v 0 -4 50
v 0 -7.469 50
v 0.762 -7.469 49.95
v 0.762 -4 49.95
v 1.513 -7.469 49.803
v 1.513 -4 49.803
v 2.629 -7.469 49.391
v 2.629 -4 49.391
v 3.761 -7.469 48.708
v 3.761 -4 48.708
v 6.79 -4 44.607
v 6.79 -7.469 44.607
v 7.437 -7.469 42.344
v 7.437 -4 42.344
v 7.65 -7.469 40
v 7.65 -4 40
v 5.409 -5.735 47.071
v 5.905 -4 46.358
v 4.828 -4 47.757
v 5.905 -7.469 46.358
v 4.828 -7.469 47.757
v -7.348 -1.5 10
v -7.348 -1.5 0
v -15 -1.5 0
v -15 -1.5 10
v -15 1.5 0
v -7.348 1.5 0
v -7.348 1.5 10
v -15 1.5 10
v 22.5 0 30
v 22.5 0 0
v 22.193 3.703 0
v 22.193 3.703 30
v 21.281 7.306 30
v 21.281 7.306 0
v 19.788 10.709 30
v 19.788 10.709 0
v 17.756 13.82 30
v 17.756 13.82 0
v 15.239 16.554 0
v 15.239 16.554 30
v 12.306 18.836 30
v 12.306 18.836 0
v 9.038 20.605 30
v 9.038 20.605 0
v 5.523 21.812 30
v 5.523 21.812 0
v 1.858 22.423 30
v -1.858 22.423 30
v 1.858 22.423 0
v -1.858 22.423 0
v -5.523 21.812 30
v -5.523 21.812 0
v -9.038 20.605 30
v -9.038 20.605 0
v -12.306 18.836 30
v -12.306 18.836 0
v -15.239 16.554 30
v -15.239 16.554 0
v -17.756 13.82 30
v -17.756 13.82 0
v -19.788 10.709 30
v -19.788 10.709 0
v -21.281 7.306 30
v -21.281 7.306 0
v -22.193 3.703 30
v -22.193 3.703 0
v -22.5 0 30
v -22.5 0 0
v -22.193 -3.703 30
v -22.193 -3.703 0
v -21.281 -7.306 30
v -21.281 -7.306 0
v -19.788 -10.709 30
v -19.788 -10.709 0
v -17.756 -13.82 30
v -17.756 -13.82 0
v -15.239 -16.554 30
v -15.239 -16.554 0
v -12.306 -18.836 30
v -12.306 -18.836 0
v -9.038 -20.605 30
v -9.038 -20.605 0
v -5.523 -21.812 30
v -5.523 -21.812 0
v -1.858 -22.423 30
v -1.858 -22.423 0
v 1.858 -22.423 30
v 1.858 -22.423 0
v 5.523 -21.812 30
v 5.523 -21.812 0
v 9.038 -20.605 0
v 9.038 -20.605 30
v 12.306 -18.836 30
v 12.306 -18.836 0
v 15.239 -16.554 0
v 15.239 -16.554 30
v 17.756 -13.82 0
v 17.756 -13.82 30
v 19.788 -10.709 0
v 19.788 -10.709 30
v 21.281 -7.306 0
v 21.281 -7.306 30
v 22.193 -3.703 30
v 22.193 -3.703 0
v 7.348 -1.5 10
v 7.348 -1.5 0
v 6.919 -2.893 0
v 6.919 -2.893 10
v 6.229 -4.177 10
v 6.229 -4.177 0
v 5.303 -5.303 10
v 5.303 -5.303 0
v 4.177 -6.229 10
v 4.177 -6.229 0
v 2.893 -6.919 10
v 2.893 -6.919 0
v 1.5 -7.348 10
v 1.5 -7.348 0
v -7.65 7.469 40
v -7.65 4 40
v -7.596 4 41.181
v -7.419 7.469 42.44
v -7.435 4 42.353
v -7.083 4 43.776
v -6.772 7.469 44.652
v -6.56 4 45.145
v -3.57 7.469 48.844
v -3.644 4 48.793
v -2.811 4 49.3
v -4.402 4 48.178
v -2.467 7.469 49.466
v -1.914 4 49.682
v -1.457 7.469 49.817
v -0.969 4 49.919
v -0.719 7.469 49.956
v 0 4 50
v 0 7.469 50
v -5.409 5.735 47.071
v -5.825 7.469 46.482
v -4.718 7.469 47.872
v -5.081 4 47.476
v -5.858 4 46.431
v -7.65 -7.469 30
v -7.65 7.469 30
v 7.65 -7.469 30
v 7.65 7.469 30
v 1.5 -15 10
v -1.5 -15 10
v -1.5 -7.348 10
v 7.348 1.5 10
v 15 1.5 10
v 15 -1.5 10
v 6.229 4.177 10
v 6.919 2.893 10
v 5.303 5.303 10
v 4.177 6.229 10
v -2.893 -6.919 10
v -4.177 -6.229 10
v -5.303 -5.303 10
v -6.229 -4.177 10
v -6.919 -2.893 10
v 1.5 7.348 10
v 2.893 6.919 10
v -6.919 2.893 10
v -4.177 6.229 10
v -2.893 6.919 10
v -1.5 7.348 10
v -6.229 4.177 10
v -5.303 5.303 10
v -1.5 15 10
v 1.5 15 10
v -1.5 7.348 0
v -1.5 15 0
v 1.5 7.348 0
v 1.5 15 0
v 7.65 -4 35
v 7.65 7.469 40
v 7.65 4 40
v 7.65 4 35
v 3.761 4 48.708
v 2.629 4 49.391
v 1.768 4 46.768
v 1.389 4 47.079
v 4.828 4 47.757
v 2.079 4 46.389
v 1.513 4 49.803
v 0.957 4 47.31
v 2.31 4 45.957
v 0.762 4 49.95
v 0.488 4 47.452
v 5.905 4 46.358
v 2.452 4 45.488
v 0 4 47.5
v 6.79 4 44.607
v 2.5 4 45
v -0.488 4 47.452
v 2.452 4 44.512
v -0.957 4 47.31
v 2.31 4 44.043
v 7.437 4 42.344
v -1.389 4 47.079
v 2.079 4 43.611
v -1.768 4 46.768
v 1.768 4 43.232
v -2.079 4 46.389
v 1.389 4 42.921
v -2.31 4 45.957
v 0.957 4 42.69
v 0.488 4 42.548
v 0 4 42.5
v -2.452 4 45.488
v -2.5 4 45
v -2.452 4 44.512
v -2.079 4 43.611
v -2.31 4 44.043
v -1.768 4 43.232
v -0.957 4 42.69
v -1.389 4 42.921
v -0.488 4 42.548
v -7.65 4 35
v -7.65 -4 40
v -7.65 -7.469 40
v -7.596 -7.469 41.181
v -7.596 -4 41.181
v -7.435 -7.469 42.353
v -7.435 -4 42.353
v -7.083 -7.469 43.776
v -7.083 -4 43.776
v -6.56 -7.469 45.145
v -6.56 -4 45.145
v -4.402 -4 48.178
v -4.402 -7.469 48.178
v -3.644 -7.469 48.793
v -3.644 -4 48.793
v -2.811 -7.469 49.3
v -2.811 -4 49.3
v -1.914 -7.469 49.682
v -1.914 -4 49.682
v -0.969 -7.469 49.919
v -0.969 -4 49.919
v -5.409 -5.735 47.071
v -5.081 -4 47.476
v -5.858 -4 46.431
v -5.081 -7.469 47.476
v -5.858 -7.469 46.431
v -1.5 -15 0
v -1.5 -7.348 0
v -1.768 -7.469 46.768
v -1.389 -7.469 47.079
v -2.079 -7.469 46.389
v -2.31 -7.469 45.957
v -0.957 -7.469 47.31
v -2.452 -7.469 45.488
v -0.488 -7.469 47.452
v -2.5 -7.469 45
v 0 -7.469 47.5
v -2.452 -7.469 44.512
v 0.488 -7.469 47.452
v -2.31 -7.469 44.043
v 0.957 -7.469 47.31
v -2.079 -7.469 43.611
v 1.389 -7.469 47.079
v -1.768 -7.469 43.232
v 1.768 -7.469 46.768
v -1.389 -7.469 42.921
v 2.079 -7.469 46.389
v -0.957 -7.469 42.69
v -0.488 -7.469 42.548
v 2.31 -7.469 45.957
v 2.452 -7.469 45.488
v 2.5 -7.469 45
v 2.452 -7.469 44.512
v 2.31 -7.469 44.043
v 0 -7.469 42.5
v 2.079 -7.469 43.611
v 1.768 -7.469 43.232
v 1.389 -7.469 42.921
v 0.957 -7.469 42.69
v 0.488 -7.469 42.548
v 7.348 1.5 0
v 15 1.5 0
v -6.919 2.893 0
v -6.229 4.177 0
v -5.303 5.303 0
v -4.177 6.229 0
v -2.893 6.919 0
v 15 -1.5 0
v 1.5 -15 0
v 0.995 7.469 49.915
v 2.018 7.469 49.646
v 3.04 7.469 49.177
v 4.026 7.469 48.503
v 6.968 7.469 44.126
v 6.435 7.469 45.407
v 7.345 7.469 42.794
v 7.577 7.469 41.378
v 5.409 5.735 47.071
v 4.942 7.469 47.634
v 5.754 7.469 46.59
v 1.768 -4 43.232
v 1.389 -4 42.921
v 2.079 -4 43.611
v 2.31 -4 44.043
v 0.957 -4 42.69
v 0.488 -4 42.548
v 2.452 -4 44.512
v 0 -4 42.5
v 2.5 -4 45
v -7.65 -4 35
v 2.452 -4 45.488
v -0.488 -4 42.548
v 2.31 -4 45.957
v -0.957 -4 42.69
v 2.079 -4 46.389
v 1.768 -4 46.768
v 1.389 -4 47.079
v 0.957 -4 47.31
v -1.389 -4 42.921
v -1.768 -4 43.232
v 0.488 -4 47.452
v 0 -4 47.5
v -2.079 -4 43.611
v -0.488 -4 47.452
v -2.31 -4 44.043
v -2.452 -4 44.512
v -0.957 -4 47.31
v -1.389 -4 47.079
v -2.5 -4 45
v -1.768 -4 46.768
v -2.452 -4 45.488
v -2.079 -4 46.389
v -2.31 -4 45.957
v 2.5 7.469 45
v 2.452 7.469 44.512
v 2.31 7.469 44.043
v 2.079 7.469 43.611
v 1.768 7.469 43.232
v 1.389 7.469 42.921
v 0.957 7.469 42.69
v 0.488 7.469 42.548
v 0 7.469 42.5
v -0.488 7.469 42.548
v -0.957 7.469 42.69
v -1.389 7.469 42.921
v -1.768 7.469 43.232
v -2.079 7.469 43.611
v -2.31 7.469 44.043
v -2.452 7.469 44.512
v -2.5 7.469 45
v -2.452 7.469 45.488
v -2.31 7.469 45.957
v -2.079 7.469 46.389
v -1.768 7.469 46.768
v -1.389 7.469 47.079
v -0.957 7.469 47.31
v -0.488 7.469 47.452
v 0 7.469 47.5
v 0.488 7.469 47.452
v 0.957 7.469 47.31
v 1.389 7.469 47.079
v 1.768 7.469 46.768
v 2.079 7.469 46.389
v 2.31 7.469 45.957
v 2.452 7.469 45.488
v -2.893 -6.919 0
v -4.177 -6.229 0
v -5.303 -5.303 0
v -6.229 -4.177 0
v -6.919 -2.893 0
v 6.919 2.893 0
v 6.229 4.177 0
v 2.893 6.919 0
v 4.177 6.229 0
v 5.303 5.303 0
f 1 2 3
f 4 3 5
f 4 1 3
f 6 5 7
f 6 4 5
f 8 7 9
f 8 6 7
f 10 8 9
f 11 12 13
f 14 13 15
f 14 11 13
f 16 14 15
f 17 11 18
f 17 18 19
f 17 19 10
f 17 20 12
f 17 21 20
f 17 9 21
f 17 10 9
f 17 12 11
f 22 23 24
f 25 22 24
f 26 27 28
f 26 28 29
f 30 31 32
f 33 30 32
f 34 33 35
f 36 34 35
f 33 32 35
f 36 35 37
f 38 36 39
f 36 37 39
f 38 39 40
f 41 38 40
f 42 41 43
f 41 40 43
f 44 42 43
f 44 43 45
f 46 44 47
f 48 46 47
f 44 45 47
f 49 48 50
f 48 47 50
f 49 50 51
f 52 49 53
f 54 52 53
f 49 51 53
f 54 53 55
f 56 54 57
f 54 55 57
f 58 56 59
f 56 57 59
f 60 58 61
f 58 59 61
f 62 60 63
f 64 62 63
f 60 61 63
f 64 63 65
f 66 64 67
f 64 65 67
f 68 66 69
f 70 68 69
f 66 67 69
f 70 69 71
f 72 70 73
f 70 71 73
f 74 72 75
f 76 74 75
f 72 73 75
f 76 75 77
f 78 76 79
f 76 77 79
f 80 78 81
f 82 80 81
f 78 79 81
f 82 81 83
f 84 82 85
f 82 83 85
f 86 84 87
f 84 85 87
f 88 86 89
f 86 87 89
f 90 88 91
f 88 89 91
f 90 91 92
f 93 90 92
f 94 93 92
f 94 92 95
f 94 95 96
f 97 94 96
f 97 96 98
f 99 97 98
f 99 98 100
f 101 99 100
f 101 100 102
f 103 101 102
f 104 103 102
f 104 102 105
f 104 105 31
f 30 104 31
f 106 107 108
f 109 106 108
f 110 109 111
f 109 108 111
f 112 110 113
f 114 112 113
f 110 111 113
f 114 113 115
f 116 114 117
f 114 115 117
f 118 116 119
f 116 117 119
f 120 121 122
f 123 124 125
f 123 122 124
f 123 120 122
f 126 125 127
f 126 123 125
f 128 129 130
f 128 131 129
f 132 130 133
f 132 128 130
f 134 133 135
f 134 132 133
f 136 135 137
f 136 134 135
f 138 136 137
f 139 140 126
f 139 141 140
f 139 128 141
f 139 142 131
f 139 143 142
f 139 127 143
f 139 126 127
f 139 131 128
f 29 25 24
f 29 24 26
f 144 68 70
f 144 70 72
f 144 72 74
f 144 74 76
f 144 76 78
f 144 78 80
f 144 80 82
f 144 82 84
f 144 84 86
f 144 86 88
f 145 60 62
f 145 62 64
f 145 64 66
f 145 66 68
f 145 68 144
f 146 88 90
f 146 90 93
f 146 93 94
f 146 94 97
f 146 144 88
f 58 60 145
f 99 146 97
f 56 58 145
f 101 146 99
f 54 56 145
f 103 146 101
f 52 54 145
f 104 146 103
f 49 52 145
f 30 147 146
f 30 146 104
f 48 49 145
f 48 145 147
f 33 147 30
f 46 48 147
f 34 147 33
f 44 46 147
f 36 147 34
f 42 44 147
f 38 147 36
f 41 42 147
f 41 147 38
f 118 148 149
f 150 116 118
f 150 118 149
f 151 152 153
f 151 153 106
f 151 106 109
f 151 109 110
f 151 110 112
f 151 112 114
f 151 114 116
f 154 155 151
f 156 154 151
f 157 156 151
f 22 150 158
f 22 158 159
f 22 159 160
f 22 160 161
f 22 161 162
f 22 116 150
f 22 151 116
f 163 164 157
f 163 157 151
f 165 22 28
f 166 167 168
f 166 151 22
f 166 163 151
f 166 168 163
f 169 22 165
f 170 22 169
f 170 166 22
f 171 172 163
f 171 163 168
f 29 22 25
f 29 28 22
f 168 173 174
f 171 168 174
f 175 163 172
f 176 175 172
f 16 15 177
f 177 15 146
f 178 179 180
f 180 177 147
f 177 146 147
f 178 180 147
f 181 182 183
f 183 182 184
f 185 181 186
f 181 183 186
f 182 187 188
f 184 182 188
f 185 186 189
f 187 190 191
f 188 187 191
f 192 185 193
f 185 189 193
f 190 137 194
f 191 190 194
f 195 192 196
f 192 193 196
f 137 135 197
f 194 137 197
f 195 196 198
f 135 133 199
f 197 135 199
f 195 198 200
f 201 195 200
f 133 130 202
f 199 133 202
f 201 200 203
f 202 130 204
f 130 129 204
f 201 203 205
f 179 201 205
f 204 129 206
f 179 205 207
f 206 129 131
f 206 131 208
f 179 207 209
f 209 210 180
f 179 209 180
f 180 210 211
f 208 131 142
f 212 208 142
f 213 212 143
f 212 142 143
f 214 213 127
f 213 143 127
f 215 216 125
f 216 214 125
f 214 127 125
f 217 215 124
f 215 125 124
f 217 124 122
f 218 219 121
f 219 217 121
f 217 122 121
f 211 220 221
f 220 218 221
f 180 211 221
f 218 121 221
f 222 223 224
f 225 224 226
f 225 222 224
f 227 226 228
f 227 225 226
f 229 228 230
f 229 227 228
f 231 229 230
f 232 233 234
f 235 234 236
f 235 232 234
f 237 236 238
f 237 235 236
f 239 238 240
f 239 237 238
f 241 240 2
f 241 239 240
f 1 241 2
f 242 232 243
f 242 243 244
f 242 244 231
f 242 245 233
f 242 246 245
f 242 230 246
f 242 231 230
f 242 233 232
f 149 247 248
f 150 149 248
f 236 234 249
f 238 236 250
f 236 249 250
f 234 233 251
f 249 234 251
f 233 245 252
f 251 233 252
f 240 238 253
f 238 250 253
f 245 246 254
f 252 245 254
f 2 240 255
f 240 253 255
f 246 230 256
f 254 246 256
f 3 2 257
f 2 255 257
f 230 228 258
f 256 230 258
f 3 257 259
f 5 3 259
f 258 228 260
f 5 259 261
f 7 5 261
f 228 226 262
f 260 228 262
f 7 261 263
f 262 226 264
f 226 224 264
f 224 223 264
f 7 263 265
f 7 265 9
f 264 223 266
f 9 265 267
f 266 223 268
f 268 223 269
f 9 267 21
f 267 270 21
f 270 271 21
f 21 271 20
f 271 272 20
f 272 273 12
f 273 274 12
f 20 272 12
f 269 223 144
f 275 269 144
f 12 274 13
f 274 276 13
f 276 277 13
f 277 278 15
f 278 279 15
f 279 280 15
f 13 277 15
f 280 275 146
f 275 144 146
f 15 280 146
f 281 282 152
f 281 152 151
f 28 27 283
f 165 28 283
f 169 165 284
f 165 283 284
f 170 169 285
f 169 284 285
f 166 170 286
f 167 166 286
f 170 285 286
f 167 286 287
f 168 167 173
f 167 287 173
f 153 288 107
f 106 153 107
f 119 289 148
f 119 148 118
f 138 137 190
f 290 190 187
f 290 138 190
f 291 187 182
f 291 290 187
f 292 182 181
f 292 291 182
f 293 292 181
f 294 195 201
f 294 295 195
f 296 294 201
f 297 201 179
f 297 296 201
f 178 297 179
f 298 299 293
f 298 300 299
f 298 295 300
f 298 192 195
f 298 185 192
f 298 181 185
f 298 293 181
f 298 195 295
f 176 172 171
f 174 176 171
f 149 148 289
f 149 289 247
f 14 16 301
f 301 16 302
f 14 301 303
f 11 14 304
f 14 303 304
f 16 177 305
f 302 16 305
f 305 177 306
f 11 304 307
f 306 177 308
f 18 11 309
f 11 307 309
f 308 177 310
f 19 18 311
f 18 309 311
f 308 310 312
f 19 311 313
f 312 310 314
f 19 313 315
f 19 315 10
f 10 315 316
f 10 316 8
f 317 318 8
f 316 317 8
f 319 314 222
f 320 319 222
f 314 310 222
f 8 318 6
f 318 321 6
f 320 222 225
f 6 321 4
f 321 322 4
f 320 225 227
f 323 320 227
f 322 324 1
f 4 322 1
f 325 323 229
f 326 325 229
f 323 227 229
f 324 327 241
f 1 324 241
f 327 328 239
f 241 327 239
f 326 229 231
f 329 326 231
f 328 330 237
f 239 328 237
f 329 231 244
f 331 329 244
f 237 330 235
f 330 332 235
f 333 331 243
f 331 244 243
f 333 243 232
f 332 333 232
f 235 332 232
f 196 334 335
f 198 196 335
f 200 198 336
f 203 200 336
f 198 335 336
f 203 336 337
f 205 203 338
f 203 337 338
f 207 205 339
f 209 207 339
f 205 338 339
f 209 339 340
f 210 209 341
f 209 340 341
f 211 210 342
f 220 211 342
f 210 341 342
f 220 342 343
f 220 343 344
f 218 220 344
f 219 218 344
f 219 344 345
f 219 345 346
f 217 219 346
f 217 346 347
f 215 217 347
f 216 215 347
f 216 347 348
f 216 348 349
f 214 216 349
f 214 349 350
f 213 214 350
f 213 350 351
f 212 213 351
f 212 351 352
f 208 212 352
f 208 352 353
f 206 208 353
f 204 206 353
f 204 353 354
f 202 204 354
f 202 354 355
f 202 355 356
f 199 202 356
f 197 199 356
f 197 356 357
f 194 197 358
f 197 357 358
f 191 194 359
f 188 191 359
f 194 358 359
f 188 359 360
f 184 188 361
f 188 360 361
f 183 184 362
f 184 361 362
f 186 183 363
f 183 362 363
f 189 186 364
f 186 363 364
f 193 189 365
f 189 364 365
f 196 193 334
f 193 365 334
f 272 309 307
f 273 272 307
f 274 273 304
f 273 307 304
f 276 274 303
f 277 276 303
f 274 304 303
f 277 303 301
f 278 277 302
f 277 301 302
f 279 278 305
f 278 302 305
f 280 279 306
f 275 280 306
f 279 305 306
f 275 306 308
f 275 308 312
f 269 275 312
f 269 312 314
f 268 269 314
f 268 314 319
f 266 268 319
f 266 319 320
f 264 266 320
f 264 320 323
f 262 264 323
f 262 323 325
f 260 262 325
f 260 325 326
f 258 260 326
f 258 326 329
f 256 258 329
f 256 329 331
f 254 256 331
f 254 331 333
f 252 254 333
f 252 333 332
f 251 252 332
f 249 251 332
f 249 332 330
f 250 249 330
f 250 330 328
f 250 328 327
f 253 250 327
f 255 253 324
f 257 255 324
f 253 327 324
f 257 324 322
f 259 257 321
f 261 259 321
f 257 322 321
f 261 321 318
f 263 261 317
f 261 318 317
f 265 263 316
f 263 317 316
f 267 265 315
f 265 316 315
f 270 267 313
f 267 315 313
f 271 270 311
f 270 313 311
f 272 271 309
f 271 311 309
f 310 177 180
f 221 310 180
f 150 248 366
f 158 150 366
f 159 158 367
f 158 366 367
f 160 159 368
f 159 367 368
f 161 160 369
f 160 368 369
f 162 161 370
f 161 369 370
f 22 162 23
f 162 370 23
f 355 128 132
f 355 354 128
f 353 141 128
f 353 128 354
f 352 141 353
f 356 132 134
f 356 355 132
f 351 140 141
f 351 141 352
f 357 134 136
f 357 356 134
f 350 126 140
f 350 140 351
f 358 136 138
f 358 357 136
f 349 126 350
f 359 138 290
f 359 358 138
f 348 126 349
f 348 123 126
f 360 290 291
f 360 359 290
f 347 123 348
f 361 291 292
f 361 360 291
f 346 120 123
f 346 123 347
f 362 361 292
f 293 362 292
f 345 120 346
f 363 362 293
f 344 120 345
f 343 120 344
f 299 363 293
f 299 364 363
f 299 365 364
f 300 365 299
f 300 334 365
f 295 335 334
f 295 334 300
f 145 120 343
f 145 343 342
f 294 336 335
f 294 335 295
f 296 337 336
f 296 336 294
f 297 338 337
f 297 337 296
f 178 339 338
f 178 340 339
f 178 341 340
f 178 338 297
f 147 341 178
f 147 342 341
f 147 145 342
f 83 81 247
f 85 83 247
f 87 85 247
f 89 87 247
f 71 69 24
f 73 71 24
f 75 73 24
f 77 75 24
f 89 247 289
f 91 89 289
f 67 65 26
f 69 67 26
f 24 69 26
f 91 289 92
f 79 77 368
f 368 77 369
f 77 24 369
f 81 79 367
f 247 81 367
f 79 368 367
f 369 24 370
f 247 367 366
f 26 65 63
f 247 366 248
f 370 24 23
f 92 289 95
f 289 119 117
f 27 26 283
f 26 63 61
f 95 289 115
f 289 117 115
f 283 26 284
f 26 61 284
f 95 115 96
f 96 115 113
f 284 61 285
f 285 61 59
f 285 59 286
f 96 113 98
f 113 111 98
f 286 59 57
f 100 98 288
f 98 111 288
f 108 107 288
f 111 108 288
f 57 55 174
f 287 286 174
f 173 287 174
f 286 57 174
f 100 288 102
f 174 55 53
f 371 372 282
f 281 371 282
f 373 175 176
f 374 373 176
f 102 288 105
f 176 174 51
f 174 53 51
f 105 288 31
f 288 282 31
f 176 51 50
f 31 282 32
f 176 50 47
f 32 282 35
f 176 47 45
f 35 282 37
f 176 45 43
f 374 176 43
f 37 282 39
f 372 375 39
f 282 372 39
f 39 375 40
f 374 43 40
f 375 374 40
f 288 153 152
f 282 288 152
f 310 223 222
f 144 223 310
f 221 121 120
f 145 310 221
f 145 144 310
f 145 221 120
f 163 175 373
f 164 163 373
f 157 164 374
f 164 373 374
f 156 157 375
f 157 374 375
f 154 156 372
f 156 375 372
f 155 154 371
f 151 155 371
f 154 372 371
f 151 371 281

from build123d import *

# Parameters (mm, degrees)
SKETCH1_R           = 22.5
BOSS_EXTRUDE1_DEPTH = 30
SKETCH2_R           = 7.5
SKETCH2_W           = 3
SKETCH2_H           = 30
SKETCH2_W_2         = 30
SKETCH2_H_2         = 3
CUT_EXTRUDE1_DEPTH  = 10
SKETCH3_W           = 15.299534312
SKETCH3_H           = 14.93812799
BOSS_EXTRUDE2_DEPTH = 20
CUT_EXTRUDE2_DEPTH  = 20
SKETCH5_R           = 2.5
CUT_EXTRUDE4_DEPTH  = 20


with BuildPart() as part:
    # Sketch1 → Boss-Extrude1 (new body)
    with BuildSketch(Plane.XY):
        Circle(SKETCH1_R)
    extrude(amount=BOSS_EXTRUDE1_DEPTH)

    # Sketch2 → Cut-Extrude1 (cut)
    with BuildSketch(Plane(origin=(0, 0, 0), x_dir=(-1, 0, 0), z_dir=(0, 0, -1))):
        Circle(SKETCH2_R)
        Rectangle(SKETCH2_W, SKETCH2_H)
        Rectangle(SKETCH2_W_2, SKETCH2_H_2)
    extrude(amount=-CUT_EXTRUDE1_DEPTH, mode=Mode.SUBTRACT)

    # Sketch3 → Boss-Extrude2 (add)
    with BuildSketch(Plane.XY.offset(30)):
        Rectangle(SKETCH3_W, SKETCH3_H)
    extrude(amount=BOSS_EXTRUDE2_DEPTH)

    # Sketch4 → Cut-Extrude2 (cut)
    with BuildSketch(Plane.ZY.offset(7.649767156)):
        Polygon((40, 4), (50, 4), (50, 0), (50, -4), (40, -4), (35, -4), (35, 4), align=None)
    extrude(amount=-CUT_EXTRUDE2_DEPTH, mode=Mode.SUBTRACT)

    # Sketch5 → Cut-Extrude4 (cut)
    with BuildSketch(Plane(origin=(0, 7.469063995, 0), x_dir=(1, 0, 0), z_dir=(0, 1, 0))):
        with Locations((0, -45)):
            Circle(SKETCH5_R)
        with BuildLine():
            Line((7.649767156, -50), (7.649767156, -40))
            add(Edge.make_bspline(
                [(0, -50), (7.649767156, -50), (7.649767156, -40)],
                knots=[3.141592654, 3.141592654, 3.141592654, 4.71238898, 4.71238898, 4.71238898], degree=2, weights=[1, 0.707106781, 1]))
            Line((0, -50), (7.649767156, -50))
        make_face()
        with BuildLine():
            Line((-7.649767156, -50), (0, -50))
            add(Edge.make_bspline(
                [(-7.649767156, -40), (-7.649767156, -50), (0, -50)],
                knots=[1.570796327, 1.570796327, 1.570796327, 3.141592654, 3.141592654, 3.141592654], degree=2, weights=[1, 0.707106781, 1]))
            Line((-7.649767156, -40), (-7.649767156, -50))
        make_face()
    extrude(amount=-CUT_EXTRUDE4_DEPTH, mode=Mode.SUBTRACT)


solid = part.part
